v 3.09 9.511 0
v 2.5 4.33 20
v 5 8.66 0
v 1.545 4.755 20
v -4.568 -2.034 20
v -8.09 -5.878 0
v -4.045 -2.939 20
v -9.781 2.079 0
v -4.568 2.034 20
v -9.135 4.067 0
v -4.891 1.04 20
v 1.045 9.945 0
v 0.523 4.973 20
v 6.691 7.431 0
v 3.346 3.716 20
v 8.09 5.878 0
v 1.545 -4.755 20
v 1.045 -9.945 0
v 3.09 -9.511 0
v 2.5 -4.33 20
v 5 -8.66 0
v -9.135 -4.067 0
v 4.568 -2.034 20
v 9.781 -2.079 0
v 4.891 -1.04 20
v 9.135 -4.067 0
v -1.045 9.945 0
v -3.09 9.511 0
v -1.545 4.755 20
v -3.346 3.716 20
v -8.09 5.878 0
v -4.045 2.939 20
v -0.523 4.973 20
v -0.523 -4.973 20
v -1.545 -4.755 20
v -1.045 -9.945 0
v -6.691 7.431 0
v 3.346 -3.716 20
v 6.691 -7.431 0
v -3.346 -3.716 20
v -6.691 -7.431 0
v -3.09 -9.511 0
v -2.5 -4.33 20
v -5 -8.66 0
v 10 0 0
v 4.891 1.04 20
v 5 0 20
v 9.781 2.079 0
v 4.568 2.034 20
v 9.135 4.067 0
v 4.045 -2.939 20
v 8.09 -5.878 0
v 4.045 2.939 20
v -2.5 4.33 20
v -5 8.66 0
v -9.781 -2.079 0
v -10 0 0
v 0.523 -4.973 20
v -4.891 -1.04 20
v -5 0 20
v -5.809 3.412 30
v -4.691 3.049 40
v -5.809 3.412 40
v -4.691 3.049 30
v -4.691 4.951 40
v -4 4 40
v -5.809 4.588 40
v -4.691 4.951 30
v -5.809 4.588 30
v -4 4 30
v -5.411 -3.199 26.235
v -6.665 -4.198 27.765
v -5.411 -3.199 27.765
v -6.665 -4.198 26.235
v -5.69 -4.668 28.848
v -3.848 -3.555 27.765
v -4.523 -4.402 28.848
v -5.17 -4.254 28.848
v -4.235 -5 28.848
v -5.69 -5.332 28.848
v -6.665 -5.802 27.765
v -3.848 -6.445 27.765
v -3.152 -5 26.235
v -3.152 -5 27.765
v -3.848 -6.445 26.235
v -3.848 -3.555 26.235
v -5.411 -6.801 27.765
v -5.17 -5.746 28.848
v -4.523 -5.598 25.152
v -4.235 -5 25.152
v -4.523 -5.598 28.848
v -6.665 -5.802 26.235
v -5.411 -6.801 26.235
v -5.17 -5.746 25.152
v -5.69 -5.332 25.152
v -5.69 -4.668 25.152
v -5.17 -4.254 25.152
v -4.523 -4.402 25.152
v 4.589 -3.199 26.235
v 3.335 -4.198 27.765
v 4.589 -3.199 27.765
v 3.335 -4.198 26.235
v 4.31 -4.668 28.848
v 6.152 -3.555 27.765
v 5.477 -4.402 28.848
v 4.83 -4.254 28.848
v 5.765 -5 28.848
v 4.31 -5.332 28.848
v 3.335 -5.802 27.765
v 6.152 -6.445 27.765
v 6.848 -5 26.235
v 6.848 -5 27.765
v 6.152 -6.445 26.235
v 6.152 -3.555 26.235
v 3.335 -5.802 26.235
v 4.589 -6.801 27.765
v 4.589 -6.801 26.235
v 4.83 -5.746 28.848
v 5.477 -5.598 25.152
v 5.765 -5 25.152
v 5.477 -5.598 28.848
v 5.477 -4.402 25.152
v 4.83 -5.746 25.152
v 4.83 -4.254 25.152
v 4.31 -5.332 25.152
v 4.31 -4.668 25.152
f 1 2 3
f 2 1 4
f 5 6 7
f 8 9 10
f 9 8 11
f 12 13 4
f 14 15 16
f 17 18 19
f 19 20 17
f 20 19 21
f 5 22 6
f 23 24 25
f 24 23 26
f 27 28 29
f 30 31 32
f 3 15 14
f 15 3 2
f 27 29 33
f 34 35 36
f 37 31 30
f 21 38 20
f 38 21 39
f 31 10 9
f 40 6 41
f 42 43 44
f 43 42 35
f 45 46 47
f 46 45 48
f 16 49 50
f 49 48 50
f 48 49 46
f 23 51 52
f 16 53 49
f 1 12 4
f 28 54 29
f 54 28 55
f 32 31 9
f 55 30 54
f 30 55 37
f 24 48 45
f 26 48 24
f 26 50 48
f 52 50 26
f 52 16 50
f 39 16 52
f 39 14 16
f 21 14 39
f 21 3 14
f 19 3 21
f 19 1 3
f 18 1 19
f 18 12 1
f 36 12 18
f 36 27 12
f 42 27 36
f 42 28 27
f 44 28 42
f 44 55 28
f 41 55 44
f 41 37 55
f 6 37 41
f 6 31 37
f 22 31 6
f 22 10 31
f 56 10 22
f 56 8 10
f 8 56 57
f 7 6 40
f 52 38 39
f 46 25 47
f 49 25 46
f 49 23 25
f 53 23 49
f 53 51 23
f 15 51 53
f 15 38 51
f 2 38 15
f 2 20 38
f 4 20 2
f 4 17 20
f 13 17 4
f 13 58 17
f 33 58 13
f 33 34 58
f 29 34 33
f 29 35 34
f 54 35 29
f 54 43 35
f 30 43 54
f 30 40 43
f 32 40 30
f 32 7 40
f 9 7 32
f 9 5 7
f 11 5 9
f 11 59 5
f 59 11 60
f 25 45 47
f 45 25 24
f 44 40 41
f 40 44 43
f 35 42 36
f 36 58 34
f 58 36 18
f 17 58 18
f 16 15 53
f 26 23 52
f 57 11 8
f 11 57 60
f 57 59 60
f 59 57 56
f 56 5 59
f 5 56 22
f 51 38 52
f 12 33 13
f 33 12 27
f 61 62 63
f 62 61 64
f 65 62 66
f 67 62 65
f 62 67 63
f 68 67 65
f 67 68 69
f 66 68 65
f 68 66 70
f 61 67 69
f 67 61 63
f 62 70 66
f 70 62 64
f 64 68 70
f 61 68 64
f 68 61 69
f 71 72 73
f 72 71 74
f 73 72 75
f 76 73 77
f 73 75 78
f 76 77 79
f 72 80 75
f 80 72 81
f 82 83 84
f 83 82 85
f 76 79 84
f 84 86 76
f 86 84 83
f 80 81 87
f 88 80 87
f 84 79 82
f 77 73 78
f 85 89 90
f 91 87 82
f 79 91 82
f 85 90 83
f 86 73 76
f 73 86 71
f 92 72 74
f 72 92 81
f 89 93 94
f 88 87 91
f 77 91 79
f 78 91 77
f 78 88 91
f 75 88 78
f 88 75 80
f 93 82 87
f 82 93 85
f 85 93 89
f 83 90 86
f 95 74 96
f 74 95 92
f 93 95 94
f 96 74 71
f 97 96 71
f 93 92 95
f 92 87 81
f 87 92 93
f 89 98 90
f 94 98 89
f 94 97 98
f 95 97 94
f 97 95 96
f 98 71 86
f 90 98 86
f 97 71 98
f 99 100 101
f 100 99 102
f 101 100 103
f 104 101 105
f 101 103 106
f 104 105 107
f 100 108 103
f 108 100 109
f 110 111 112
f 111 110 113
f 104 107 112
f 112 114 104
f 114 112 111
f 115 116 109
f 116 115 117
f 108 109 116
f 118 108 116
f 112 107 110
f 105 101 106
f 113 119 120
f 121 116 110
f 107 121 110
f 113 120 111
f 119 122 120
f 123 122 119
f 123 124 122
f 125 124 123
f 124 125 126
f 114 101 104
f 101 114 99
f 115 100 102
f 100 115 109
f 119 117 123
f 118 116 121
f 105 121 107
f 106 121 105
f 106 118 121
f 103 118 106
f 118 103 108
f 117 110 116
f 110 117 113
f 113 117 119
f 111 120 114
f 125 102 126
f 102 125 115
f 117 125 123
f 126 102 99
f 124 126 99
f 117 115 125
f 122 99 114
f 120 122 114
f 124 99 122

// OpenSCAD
cylinder(h=20, r1=10, r2=5);

// Create the nose
translate([-5, 4, 30])
    cylinder(h=10, r=1);

// Create the eyes
translate([-5, -5, 27])
    sphere(r=2);
translate([5, -5, 27])
    sphere(r=2);
